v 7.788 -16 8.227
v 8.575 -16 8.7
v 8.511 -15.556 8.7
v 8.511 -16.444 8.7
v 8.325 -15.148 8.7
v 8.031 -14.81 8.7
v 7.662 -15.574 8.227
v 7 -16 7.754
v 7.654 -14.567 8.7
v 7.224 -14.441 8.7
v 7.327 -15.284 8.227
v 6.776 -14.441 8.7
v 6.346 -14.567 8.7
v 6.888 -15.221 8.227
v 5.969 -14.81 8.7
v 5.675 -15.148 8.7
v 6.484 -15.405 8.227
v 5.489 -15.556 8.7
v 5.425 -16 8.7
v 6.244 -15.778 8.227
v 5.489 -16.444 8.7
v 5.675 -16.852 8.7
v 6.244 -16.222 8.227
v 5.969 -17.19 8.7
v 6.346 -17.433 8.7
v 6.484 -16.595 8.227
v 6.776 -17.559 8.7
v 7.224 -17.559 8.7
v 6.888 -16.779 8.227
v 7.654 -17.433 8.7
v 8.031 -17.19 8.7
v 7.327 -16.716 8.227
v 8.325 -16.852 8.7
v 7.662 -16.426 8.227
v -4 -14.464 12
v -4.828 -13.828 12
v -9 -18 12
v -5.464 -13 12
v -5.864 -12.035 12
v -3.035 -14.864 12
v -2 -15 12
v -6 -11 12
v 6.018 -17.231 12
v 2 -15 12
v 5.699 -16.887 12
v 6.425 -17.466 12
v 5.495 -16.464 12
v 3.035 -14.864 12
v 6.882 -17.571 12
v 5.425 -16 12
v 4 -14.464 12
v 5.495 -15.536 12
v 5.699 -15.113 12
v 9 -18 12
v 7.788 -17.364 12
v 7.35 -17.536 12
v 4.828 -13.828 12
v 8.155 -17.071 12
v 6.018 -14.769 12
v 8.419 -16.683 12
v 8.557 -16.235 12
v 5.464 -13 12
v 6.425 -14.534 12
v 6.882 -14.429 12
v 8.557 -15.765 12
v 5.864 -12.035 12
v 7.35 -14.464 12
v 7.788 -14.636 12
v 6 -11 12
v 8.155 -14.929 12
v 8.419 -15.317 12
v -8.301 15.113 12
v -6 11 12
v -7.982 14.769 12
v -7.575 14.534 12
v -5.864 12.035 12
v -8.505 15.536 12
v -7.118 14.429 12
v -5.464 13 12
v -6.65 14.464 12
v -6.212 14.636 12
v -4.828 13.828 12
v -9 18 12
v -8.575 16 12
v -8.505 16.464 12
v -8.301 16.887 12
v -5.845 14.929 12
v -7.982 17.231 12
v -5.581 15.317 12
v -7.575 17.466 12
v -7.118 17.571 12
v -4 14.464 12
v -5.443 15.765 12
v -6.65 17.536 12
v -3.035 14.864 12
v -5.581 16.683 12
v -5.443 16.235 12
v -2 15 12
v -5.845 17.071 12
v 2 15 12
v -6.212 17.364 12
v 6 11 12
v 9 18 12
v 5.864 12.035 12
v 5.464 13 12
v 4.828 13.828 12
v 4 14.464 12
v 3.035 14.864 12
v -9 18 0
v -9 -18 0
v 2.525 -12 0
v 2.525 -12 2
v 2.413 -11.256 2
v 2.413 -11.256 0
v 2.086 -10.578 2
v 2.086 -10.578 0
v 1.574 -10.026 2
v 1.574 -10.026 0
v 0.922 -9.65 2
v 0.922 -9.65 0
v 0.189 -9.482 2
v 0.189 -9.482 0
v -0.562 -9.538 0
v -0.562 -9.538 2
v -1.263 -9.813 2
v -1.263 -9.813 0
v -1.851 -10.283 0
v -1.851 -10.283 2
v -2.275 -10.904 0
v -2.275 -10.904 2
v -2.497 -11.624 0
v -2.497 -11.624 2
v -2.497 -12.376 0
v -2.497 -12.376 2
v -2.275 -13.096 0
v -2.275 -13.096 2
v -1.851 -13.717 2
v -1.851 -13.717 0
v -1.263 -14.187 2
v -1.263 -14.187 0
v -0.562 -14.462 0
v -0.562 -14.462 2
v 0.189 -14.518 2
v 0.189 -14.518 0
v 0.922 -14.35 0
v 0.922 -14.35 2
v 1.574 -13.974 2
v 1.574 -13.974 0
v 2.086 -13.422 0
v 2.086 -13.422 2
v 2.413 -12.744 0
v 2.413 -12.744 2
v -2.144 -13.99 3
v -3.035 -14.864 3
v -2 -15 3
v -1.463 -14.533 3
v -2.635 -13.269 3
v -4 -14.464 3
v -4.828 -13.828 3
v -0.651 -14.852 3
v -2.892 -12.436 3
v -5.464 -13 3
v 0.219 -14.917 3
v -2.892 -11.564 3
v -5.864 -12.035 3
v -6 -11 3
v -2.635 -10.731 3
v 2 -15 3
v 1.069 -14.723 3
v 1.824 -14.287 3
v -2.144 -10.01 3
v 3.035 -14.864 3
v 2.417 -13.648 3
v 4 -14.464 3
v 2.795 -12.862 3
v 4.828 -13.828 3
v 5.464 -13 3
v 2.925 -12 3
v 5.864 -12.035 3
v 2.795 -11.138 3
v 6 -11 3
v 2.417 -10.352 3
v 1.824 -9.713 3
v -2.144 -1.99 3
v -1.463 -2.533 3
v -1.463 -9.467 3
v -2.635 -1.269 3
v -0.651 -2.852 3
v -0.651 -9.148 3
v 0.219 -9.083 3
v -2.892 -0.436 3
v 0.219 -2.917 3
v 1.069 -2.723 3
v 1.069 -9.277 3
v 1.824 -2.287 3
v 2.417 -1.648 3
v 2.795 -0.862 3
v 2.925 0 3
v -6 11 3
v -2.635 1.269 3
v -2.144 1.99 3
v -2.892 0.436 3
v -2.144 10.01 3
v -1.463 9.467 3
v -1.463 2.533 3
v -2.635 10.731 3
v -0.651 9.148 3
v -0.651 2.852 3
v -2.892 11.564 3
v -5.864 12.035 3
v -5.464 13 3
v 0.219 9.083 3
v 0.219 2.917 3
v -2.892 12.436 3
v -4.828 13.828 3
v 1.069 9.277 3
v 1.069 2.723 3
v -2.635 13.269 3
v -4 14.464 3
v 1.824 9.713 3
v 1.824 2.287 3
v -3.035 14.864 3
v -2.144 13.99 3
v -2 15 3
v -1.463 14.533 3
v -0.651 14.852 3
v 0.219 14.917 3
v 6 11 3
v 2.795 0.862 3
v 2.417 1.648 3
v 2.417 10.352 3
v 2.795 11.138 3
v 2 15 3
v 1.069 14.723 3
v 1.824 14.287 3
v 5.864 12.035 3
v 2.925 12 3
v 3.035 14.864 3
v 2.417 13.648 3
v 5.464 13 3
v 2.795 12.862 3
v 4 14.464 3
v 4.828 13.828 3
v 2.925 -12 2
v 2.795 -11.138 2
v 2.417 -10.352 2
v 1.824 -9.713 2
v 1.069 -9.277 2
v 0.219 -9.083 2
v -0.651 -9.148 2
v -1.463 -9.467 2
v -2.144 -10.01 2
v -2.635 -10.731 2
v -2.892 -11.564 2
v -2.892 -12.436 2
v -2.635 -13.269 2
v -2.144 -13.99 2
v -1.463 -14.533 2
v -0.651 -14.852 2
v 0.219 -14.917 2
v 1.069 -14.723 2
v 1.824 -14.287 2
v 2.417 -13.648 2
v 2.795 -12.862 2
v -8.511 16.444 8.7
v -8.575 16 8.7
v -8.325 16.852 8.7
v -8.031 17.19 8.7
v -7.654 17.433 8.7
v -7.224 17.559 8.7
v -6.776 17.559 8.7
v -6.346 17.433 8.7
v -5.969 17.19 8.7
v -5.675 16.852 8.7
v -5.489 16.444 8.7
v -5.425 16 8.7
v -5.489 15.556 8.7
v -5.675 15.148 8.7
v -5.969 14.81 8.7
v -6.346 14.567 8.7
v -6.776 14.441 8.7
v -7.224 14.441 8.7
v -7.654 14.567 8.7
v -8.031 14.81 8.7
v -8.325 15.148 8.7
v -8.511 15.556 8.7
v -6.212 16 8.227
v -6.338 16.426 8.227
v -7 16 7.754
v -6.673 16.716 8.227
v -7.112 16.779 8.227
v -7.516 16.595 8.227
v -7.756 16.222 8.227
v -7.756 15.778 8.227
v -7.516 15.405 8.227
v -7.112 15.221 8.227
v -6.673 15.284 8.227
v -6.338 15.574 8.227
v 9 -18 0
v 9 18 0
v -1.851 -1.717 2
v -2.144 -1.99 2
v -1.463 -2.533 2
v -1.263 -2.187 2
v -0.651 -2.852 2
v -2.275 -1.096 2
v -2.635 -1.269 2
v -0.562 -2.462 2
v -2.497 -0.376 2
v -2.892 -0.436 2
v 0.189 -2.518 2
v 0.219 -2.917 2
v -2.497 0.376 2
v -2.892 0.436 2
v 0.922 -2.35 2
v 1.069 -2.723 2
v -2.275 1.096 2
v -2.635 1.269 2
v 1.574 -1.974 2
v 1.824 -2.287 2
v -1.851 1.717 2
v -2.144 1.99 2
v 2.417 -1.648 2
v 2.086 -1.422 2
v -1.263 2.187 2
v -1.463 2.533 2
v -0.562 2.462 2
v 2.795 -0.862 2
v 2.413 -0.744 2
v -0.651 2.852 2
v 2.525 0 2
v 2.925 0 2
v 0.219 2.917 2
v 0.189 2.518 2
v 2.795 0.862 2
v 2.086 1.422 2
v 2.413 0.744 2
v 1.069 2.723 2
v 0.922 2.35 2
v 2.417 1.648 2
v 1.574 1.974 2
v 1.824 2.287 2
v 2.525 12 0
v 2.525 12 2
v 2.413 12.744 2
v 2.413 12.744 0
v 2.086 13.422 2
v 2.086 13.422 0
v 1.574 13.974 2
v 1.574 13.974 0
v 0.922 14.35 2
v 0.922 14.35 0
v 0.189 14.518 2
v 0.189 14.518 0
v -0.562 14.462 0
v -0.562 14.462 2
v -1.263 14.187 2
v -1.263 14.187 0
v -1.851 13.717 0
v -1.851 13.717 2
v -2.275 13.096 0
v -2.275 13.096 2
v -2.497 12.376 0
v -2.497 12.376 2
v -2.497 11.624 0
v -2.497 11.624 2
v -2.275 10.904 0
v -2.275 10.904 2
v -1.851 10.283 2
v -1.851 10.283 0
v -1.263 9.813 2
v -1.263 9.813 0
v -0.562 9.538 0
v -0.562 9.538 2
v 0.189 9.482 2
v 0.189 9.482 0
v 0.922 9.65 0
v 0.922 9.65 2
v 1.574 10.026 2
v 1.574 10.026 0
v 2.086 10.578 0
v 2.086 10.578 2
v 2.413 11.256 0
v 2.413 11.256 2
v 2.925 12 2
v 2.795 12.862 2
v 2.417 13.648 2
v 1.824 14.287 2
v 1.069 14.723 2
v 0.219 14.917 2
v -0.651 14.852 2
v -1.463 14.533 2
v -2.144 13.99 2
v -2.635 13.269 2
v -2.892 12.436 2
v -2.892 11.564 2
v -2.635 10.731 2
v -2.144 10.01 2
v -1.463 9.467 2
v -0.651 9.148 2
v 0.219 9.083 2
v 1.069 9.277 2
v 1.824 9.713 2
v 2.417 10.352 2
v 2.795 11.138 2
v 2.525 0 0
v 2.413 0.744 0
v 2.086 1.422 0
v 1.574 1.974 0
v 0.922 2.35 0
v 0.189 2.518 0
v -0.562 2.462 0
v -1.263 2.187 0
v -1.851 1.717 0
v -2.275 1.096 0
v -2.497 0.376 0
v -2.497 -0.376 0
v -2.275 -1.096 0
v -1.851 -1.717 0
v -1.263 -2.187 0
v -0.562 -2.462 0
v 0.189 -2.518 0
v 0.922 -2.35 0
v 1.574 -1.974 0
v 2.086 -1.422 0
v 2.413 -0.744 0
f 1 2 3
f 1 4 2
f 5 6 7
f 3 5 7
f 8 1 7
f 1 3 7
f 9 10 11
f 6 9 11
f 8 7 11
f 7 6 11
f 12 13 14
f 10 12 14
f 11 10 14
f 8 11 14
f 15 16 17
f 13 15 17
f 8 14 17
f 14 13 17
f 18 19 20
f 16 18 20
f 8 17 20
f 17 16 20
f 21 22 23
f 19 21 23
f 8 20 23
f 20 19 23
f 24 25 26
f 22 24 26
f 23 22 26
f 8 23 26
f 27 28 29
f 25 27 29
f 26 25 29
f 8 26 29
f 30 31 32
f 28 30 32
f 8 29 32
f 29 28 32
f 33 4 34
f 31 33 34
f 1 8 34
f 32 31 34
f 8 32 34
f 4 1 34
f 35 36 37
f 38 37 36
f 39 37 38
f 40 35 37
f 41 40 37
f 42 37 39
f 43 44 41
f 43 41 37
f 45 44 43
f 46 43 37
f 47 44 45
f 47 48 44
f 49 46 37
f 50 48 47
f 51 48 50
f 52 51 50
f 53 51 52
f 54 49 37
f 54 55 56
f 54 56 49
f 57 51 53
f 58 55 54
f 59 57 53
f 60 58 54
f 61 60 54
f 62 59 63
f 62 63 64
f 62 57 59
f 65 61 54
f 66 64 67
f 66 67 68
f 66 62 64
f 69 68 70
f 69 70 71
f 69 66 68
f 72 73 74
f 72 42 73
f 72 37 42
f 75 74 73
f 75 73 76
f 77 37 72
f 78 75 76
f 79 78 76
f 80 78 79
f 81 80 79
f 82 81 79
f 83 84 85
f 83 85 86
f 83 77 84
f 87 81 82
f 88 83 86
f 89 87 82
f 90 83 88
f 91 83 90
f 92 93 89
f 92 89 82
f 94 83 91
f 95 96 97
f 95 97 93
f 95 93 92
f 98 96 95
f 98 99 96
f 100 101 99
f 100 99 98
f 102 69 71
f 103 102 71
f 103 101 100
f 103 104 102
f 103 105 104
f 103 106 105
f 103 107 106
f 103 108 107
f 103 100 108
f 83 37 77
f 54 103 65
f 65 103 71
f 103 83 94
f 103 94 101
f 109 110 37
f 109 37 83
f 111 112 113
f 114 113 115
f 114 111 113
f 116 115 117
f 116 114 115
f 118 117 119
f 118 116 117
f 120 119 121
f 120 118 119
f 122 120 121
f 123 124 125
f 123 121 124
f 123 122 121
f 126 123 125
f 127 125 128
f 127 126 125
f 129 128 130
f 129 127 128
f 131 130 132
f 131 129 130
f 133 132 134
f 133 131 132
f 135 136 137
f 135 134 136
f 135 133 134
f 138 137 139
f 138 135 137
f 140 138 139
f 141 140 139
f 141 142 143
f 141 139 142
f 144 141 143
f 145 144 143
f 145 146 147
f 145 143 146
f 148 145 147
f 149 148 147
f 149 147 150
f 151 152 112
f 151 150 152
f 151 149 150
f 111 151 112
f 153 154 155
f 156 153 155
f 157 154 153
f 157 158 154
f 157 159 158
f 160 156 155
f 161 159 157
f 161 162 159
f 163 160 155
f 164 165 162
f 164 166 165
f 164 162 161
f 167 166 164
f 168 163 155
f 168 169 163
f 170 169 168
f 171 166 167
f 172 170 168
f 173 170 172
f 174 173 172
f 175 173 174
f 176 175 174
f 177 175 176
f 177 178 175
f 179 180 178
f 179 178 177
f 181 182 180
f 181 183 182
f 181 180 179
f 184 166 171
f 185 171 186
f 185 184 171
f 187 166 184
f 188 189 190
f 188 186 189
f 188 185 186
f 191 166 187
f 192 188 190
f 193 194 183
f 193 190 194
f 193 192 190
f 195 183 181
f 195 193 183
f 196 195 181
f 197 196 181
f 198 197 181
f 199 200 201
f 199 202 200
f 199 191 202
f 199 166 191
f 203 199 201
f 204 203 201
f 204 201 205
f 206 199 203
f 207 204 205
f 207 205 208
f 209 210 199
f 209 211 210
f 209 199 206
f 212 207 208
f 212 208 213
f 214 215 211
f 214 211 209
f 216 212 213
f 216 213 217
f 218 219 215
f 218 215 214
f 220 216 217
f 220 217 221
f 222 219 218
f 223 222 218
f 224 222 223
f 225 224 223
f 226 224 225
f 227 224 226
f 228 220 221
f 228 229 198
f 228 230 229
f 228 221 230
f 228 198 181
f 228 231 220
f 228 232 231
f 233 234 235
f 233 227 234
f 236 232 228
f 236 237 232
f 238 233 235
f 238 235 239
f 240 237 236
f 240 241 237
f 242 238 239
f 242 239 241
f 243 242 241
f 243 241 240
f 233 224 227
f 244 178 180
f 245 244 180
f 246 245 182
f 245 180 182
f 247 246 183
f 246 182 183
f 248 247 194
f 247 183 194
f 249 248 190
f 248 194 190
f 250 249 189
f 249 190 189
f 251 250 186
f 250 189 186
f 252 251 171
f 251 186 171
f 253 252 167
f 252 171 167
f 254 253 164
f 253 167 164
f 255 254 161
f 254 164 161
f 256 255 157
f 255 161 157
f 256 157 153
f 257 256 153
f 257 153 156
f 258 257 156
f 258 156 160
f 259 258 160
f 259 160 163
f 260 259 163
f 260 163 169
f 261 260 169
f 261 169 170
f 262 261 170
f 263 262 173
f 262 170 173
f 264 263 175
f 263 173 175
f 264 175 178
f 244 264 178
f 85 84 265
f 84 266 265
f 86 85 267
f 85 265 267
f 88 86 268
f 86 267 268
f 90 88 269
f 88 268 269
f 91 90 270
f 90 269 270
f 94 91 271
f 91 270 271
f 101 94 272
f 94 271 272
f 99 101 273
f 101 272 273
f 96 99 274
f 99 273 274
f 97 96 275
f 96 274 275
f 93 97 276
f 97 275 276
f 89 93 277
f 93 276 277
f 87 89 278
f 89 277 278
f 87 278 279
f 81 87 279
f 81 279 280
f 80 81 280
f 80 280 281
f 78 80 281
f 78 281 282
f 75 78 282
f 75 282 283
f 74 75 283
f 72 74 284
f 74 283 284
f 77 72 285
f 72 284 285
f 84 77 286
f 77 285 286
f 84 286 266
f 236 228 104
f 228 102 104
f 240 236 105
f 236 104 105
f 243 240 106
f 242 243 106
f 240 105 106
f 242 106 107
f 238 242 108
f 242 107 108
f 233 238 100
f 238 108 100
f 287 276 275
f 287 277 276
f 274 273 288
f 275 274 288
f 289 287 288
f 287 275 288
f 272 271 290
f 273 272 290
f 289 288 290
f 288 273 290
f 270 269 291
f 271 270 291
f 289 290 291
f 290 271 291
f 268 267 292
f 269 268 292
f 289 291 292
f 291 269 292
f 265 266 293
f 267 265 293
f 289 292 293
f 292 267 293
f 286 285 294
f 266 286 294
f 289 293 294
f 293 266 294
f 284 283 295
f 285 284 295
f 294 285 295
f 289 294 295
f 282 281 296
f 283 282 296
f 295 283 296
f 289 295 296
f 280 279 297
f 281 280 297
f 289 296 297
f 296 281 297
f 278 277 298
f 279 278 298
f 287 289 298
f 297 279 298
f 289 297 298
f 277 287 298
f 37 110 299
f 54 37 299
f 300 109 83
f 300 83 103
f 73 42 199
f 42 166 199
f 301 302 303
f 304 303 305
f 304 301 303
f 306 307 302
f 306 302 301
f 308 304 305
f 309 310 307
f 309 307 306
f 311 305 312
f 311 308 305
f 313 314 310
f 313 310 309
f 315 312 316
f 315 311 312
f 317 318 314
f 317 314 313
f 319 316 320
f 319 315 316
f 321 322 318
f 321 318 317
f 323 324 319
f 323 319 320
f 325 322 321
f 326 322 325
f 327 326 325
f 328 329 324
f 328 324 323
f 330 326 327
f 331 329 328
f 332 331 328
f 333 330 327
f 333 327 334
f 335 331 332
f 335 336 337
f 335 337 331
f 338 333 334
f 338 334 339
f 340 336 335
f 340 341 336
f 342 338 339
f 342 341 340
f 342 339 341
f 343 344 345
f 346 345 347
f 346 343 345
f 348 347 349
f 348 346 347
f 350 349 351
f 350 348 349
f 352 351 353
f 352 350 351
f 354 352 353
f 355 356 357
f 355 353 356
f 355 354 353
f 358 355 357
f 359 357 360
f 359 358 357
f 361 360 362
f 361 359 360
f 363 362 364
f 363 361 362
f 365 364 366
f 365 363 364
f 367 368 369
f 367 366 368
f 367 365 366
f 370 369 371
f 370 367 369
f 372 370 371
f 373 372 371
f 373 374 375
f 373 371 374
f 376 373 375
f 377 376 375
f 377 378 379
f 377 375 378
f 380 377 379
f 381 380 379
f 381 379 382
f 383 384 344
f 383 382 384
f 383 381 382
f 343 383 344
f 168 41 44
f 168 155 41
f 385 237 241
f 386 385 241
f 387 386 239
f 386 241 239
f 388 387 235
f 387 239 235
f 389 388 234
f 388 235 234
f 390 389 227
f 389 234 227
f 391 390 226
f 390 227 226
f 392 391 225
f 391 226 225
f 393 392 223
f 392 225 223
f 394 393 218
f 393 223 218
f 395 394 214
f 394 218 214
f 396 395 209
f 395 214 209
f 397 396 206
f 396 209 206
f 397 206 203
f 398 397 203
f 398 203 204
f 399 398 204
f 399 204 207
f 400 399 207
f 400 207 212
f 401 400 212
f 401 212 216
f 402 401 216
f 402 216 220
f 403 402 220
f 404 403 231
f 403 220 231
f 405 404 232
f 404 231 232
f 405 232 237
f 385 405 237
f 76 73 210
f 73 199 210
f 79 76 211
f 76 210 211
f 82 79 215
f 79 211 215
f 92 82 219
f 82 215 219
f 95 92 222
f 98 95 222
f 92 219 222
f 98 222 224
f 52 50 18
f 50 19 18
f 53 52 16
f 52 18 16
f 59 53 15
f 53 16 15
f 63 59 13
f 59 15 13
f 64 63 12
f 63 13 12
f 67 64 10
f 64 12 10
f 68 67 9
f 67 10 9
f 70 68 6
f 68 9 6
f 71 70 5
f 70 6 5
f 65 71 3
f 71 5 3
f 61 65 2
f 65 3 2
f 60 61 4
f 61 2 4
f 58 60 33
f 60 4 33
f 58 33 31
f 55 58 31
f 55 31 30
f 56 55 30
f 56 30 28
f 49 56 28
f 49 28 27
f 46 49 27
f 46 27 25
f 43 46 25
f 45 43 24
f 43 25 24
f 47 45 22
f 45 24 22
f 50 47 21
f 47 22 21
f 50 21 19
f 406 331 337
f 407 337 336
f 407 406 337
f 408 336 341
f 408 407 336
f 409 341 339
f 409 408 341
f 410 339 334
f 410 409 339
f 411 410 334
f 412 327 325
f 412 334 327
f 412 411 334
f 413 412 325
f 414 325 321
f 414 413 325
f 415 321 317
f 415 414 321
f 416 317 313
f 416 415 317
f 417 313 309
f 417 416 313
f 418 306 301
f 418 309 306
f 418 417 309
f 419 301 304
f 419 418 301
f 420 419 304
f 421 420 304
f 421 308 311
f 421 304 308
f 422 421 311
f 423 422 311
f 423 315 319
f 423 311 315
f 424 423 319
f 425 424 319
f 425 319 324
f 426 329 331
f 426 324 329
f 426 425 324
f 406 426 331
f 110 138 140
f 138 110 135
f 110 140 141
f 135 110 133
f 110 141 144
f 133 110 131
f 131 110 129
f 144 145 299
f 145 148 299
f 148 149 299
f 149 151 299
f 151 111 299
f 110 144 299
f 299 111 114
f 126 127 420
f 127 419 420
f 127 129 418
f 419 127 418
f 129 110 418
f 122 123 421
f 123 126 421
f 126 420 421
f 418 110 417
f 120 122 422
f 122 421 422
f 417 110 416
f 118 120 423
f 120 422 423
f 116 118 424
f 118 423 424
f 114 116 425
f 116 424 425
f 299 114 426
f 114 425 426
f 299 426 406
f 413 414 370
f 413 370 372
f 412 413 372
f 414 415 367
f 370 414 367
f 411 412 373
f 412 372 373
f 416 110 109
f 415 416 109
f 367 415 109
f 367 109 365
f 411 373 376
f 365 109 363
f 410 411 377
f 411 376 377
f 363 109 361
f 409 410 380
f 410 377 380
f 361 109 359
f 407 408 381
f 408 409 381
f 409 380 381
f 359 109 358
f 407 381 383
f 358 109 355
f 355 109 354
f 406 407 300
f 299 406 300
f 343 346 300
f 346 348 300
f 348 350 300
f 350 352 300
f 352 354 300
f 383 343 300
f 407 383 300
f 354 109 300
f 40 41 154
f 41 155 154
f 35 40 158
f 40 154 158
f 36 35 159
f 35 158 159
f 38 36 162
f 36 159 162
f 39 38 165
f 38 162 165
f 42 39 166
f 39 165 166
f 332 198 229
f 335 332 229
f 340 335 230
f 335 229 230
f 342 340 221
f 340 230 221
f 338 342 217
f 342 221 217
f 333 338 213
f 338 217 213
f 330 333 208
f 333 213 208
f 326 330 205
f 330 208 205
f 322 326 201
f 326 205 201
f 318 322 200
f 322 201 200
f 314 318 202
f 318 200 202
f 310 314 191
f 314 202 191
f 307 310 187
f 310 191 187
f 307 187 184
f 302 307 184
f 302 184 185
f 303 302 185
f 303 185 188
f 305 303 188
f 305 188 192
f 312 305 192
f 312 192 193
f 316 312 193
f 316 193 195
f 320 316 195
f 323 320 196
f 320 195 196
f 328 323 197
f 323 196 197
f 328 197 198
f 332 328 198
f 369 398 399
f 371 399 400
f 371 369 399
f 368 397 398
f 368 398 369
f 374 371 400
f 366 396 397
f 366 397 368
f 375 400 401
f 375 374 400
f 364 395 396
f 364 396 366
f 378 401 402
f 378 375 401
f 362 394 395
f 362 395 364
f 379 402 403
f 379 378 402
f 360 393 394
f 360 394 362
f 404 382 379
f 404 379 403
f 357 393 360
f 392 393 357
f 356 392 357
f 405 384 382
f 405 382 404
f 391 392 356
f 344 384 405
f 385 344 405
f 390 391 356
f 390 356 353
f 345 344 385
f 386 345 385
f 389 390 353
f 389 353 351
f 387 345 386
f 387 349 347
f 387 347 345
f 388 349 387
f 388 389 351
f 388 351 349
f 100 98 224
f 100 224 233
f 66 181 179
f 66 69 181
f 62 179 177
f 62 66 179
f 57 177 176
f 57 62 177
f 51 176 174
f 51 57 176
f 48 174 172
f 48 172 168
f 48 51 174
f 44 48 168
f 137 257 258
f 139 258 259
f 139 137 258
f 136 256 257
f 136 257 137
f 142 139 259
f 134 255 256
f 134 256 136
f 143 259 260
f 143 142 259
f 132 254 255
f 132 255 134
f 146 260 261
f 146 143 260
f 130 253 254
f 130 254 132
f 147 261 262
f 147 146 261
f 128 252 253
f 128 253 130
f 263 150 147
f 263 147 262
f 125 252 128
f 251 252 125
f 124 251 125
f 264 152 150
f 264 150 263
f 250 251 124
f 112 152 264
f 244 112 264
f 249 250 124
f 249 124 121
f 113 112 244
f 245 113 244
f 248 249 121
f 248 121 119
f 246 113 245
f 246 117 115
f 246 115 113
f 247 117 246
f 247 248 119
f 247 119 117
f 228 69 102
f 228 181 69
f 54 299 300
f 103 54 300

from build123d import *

# Parameters (mm, degrees)
SKETCH1_W                        = 18
SKETCH1_H                        = 36
BOSS_EXTRUDE1_DEPTH              = 12
SHELL1_T                         = -3
SKETCH1_3_R                      = 2.525
CUT_EXTRUDE1_DEPTH               = 10
SKETCH2_R                        = 2.925
CUT_EXTRUDE2_DEPTH               = 1
FILLET1_R                        = 4
TAP_DRILL_FOR_M3_HELICOIL1_D     = 3.15
TAP_DRILL_FOR_M3_HELICOIL1_DEPTH = 3.3
TAP_DRILL_FOR_M3_HELICOIL1_TIP   = 0.946355475


with BuildPart() as part:
    # Sketch1 → Boss-Extrude1 (new body)
    with BuildSketch(Plane.XY):
        Rectangle(SKETCH1_W, SKETCH1_H)
    extrude(amount=BOSS_EXTRUDE1_DEPTH)

    # Shell1
    shell1_openings = [part.faces().sort_by_distance(p)[0] for p in [
        (0, 0, 12),
    ]]
    offset(amount=SHELL1_T, openings=shell1_openings, kind=Kind.INTERSECTION)

    # Sketch1<3> → Cut-Extrude1 (cut)
    with BuildSketch(Plane.XY):
        with Locations((0, 12)):
            Circle(SKETCH1_3_R)
        Circle(SKETCH1_3_R)
        with Locations((0, -12)):
            Circle(SKETCH1_3_R)
    extrude(amount=CUT_EXTRUDE1_DEPTH, mode=Mode.SUBTRACT)

    # Sketch2 → Cut-Extrude2 (cut)
    with BuildSketch(Plane.XY.offset(3)):
        with Locations((0, 12)):
            Circle(SKETCH2_R)
        Circle(SKETCH2_R)
        with Locations((0, -12)):
            Circle(SKETCH2_R)
    extrude(amount=-CUT_EXTRUDE2_DEPTH, mode=Mode.SUBTRACT)

    # Fillet1
    fillet1_edges = [part.edges().sort_by_distance(p)[0] for p in [
        (-6, 15, 7.5),
        (6, 15, 7.5),
        (-6, -15, 7.5),
        (6, -15, 7.5),
    ]]
    fillet(fillet1_edges, radius=FILLET1_R)

    # Tap Drill for M3 Helicoil1
    with Locations(Plane.XY.offset(12)):
        with Locations((7, -16), (-7, 16)):
            Hole(TAP_DRILL_FOR_M3_HELICOIL1_D / 2, depth=TAP_DRILL_FOR_M3_HELICOIL1_DEPTH)
            with Locations((0, 0, -(TAP_DRILL_FOR_M3_HELICOIL1_DEPTH + TAP_DRILL_FOR_M3_HELICOIL1_TIP / 2))):  # 118° drill point
                Cone(0, TAP_DRILL_FOR_M3_HELICOIL1_D / 2, TAP_DRILL_FOR_M3_HELICOIL1_TIP, mode=Mode.SUBTRACT)


solid = part.part
